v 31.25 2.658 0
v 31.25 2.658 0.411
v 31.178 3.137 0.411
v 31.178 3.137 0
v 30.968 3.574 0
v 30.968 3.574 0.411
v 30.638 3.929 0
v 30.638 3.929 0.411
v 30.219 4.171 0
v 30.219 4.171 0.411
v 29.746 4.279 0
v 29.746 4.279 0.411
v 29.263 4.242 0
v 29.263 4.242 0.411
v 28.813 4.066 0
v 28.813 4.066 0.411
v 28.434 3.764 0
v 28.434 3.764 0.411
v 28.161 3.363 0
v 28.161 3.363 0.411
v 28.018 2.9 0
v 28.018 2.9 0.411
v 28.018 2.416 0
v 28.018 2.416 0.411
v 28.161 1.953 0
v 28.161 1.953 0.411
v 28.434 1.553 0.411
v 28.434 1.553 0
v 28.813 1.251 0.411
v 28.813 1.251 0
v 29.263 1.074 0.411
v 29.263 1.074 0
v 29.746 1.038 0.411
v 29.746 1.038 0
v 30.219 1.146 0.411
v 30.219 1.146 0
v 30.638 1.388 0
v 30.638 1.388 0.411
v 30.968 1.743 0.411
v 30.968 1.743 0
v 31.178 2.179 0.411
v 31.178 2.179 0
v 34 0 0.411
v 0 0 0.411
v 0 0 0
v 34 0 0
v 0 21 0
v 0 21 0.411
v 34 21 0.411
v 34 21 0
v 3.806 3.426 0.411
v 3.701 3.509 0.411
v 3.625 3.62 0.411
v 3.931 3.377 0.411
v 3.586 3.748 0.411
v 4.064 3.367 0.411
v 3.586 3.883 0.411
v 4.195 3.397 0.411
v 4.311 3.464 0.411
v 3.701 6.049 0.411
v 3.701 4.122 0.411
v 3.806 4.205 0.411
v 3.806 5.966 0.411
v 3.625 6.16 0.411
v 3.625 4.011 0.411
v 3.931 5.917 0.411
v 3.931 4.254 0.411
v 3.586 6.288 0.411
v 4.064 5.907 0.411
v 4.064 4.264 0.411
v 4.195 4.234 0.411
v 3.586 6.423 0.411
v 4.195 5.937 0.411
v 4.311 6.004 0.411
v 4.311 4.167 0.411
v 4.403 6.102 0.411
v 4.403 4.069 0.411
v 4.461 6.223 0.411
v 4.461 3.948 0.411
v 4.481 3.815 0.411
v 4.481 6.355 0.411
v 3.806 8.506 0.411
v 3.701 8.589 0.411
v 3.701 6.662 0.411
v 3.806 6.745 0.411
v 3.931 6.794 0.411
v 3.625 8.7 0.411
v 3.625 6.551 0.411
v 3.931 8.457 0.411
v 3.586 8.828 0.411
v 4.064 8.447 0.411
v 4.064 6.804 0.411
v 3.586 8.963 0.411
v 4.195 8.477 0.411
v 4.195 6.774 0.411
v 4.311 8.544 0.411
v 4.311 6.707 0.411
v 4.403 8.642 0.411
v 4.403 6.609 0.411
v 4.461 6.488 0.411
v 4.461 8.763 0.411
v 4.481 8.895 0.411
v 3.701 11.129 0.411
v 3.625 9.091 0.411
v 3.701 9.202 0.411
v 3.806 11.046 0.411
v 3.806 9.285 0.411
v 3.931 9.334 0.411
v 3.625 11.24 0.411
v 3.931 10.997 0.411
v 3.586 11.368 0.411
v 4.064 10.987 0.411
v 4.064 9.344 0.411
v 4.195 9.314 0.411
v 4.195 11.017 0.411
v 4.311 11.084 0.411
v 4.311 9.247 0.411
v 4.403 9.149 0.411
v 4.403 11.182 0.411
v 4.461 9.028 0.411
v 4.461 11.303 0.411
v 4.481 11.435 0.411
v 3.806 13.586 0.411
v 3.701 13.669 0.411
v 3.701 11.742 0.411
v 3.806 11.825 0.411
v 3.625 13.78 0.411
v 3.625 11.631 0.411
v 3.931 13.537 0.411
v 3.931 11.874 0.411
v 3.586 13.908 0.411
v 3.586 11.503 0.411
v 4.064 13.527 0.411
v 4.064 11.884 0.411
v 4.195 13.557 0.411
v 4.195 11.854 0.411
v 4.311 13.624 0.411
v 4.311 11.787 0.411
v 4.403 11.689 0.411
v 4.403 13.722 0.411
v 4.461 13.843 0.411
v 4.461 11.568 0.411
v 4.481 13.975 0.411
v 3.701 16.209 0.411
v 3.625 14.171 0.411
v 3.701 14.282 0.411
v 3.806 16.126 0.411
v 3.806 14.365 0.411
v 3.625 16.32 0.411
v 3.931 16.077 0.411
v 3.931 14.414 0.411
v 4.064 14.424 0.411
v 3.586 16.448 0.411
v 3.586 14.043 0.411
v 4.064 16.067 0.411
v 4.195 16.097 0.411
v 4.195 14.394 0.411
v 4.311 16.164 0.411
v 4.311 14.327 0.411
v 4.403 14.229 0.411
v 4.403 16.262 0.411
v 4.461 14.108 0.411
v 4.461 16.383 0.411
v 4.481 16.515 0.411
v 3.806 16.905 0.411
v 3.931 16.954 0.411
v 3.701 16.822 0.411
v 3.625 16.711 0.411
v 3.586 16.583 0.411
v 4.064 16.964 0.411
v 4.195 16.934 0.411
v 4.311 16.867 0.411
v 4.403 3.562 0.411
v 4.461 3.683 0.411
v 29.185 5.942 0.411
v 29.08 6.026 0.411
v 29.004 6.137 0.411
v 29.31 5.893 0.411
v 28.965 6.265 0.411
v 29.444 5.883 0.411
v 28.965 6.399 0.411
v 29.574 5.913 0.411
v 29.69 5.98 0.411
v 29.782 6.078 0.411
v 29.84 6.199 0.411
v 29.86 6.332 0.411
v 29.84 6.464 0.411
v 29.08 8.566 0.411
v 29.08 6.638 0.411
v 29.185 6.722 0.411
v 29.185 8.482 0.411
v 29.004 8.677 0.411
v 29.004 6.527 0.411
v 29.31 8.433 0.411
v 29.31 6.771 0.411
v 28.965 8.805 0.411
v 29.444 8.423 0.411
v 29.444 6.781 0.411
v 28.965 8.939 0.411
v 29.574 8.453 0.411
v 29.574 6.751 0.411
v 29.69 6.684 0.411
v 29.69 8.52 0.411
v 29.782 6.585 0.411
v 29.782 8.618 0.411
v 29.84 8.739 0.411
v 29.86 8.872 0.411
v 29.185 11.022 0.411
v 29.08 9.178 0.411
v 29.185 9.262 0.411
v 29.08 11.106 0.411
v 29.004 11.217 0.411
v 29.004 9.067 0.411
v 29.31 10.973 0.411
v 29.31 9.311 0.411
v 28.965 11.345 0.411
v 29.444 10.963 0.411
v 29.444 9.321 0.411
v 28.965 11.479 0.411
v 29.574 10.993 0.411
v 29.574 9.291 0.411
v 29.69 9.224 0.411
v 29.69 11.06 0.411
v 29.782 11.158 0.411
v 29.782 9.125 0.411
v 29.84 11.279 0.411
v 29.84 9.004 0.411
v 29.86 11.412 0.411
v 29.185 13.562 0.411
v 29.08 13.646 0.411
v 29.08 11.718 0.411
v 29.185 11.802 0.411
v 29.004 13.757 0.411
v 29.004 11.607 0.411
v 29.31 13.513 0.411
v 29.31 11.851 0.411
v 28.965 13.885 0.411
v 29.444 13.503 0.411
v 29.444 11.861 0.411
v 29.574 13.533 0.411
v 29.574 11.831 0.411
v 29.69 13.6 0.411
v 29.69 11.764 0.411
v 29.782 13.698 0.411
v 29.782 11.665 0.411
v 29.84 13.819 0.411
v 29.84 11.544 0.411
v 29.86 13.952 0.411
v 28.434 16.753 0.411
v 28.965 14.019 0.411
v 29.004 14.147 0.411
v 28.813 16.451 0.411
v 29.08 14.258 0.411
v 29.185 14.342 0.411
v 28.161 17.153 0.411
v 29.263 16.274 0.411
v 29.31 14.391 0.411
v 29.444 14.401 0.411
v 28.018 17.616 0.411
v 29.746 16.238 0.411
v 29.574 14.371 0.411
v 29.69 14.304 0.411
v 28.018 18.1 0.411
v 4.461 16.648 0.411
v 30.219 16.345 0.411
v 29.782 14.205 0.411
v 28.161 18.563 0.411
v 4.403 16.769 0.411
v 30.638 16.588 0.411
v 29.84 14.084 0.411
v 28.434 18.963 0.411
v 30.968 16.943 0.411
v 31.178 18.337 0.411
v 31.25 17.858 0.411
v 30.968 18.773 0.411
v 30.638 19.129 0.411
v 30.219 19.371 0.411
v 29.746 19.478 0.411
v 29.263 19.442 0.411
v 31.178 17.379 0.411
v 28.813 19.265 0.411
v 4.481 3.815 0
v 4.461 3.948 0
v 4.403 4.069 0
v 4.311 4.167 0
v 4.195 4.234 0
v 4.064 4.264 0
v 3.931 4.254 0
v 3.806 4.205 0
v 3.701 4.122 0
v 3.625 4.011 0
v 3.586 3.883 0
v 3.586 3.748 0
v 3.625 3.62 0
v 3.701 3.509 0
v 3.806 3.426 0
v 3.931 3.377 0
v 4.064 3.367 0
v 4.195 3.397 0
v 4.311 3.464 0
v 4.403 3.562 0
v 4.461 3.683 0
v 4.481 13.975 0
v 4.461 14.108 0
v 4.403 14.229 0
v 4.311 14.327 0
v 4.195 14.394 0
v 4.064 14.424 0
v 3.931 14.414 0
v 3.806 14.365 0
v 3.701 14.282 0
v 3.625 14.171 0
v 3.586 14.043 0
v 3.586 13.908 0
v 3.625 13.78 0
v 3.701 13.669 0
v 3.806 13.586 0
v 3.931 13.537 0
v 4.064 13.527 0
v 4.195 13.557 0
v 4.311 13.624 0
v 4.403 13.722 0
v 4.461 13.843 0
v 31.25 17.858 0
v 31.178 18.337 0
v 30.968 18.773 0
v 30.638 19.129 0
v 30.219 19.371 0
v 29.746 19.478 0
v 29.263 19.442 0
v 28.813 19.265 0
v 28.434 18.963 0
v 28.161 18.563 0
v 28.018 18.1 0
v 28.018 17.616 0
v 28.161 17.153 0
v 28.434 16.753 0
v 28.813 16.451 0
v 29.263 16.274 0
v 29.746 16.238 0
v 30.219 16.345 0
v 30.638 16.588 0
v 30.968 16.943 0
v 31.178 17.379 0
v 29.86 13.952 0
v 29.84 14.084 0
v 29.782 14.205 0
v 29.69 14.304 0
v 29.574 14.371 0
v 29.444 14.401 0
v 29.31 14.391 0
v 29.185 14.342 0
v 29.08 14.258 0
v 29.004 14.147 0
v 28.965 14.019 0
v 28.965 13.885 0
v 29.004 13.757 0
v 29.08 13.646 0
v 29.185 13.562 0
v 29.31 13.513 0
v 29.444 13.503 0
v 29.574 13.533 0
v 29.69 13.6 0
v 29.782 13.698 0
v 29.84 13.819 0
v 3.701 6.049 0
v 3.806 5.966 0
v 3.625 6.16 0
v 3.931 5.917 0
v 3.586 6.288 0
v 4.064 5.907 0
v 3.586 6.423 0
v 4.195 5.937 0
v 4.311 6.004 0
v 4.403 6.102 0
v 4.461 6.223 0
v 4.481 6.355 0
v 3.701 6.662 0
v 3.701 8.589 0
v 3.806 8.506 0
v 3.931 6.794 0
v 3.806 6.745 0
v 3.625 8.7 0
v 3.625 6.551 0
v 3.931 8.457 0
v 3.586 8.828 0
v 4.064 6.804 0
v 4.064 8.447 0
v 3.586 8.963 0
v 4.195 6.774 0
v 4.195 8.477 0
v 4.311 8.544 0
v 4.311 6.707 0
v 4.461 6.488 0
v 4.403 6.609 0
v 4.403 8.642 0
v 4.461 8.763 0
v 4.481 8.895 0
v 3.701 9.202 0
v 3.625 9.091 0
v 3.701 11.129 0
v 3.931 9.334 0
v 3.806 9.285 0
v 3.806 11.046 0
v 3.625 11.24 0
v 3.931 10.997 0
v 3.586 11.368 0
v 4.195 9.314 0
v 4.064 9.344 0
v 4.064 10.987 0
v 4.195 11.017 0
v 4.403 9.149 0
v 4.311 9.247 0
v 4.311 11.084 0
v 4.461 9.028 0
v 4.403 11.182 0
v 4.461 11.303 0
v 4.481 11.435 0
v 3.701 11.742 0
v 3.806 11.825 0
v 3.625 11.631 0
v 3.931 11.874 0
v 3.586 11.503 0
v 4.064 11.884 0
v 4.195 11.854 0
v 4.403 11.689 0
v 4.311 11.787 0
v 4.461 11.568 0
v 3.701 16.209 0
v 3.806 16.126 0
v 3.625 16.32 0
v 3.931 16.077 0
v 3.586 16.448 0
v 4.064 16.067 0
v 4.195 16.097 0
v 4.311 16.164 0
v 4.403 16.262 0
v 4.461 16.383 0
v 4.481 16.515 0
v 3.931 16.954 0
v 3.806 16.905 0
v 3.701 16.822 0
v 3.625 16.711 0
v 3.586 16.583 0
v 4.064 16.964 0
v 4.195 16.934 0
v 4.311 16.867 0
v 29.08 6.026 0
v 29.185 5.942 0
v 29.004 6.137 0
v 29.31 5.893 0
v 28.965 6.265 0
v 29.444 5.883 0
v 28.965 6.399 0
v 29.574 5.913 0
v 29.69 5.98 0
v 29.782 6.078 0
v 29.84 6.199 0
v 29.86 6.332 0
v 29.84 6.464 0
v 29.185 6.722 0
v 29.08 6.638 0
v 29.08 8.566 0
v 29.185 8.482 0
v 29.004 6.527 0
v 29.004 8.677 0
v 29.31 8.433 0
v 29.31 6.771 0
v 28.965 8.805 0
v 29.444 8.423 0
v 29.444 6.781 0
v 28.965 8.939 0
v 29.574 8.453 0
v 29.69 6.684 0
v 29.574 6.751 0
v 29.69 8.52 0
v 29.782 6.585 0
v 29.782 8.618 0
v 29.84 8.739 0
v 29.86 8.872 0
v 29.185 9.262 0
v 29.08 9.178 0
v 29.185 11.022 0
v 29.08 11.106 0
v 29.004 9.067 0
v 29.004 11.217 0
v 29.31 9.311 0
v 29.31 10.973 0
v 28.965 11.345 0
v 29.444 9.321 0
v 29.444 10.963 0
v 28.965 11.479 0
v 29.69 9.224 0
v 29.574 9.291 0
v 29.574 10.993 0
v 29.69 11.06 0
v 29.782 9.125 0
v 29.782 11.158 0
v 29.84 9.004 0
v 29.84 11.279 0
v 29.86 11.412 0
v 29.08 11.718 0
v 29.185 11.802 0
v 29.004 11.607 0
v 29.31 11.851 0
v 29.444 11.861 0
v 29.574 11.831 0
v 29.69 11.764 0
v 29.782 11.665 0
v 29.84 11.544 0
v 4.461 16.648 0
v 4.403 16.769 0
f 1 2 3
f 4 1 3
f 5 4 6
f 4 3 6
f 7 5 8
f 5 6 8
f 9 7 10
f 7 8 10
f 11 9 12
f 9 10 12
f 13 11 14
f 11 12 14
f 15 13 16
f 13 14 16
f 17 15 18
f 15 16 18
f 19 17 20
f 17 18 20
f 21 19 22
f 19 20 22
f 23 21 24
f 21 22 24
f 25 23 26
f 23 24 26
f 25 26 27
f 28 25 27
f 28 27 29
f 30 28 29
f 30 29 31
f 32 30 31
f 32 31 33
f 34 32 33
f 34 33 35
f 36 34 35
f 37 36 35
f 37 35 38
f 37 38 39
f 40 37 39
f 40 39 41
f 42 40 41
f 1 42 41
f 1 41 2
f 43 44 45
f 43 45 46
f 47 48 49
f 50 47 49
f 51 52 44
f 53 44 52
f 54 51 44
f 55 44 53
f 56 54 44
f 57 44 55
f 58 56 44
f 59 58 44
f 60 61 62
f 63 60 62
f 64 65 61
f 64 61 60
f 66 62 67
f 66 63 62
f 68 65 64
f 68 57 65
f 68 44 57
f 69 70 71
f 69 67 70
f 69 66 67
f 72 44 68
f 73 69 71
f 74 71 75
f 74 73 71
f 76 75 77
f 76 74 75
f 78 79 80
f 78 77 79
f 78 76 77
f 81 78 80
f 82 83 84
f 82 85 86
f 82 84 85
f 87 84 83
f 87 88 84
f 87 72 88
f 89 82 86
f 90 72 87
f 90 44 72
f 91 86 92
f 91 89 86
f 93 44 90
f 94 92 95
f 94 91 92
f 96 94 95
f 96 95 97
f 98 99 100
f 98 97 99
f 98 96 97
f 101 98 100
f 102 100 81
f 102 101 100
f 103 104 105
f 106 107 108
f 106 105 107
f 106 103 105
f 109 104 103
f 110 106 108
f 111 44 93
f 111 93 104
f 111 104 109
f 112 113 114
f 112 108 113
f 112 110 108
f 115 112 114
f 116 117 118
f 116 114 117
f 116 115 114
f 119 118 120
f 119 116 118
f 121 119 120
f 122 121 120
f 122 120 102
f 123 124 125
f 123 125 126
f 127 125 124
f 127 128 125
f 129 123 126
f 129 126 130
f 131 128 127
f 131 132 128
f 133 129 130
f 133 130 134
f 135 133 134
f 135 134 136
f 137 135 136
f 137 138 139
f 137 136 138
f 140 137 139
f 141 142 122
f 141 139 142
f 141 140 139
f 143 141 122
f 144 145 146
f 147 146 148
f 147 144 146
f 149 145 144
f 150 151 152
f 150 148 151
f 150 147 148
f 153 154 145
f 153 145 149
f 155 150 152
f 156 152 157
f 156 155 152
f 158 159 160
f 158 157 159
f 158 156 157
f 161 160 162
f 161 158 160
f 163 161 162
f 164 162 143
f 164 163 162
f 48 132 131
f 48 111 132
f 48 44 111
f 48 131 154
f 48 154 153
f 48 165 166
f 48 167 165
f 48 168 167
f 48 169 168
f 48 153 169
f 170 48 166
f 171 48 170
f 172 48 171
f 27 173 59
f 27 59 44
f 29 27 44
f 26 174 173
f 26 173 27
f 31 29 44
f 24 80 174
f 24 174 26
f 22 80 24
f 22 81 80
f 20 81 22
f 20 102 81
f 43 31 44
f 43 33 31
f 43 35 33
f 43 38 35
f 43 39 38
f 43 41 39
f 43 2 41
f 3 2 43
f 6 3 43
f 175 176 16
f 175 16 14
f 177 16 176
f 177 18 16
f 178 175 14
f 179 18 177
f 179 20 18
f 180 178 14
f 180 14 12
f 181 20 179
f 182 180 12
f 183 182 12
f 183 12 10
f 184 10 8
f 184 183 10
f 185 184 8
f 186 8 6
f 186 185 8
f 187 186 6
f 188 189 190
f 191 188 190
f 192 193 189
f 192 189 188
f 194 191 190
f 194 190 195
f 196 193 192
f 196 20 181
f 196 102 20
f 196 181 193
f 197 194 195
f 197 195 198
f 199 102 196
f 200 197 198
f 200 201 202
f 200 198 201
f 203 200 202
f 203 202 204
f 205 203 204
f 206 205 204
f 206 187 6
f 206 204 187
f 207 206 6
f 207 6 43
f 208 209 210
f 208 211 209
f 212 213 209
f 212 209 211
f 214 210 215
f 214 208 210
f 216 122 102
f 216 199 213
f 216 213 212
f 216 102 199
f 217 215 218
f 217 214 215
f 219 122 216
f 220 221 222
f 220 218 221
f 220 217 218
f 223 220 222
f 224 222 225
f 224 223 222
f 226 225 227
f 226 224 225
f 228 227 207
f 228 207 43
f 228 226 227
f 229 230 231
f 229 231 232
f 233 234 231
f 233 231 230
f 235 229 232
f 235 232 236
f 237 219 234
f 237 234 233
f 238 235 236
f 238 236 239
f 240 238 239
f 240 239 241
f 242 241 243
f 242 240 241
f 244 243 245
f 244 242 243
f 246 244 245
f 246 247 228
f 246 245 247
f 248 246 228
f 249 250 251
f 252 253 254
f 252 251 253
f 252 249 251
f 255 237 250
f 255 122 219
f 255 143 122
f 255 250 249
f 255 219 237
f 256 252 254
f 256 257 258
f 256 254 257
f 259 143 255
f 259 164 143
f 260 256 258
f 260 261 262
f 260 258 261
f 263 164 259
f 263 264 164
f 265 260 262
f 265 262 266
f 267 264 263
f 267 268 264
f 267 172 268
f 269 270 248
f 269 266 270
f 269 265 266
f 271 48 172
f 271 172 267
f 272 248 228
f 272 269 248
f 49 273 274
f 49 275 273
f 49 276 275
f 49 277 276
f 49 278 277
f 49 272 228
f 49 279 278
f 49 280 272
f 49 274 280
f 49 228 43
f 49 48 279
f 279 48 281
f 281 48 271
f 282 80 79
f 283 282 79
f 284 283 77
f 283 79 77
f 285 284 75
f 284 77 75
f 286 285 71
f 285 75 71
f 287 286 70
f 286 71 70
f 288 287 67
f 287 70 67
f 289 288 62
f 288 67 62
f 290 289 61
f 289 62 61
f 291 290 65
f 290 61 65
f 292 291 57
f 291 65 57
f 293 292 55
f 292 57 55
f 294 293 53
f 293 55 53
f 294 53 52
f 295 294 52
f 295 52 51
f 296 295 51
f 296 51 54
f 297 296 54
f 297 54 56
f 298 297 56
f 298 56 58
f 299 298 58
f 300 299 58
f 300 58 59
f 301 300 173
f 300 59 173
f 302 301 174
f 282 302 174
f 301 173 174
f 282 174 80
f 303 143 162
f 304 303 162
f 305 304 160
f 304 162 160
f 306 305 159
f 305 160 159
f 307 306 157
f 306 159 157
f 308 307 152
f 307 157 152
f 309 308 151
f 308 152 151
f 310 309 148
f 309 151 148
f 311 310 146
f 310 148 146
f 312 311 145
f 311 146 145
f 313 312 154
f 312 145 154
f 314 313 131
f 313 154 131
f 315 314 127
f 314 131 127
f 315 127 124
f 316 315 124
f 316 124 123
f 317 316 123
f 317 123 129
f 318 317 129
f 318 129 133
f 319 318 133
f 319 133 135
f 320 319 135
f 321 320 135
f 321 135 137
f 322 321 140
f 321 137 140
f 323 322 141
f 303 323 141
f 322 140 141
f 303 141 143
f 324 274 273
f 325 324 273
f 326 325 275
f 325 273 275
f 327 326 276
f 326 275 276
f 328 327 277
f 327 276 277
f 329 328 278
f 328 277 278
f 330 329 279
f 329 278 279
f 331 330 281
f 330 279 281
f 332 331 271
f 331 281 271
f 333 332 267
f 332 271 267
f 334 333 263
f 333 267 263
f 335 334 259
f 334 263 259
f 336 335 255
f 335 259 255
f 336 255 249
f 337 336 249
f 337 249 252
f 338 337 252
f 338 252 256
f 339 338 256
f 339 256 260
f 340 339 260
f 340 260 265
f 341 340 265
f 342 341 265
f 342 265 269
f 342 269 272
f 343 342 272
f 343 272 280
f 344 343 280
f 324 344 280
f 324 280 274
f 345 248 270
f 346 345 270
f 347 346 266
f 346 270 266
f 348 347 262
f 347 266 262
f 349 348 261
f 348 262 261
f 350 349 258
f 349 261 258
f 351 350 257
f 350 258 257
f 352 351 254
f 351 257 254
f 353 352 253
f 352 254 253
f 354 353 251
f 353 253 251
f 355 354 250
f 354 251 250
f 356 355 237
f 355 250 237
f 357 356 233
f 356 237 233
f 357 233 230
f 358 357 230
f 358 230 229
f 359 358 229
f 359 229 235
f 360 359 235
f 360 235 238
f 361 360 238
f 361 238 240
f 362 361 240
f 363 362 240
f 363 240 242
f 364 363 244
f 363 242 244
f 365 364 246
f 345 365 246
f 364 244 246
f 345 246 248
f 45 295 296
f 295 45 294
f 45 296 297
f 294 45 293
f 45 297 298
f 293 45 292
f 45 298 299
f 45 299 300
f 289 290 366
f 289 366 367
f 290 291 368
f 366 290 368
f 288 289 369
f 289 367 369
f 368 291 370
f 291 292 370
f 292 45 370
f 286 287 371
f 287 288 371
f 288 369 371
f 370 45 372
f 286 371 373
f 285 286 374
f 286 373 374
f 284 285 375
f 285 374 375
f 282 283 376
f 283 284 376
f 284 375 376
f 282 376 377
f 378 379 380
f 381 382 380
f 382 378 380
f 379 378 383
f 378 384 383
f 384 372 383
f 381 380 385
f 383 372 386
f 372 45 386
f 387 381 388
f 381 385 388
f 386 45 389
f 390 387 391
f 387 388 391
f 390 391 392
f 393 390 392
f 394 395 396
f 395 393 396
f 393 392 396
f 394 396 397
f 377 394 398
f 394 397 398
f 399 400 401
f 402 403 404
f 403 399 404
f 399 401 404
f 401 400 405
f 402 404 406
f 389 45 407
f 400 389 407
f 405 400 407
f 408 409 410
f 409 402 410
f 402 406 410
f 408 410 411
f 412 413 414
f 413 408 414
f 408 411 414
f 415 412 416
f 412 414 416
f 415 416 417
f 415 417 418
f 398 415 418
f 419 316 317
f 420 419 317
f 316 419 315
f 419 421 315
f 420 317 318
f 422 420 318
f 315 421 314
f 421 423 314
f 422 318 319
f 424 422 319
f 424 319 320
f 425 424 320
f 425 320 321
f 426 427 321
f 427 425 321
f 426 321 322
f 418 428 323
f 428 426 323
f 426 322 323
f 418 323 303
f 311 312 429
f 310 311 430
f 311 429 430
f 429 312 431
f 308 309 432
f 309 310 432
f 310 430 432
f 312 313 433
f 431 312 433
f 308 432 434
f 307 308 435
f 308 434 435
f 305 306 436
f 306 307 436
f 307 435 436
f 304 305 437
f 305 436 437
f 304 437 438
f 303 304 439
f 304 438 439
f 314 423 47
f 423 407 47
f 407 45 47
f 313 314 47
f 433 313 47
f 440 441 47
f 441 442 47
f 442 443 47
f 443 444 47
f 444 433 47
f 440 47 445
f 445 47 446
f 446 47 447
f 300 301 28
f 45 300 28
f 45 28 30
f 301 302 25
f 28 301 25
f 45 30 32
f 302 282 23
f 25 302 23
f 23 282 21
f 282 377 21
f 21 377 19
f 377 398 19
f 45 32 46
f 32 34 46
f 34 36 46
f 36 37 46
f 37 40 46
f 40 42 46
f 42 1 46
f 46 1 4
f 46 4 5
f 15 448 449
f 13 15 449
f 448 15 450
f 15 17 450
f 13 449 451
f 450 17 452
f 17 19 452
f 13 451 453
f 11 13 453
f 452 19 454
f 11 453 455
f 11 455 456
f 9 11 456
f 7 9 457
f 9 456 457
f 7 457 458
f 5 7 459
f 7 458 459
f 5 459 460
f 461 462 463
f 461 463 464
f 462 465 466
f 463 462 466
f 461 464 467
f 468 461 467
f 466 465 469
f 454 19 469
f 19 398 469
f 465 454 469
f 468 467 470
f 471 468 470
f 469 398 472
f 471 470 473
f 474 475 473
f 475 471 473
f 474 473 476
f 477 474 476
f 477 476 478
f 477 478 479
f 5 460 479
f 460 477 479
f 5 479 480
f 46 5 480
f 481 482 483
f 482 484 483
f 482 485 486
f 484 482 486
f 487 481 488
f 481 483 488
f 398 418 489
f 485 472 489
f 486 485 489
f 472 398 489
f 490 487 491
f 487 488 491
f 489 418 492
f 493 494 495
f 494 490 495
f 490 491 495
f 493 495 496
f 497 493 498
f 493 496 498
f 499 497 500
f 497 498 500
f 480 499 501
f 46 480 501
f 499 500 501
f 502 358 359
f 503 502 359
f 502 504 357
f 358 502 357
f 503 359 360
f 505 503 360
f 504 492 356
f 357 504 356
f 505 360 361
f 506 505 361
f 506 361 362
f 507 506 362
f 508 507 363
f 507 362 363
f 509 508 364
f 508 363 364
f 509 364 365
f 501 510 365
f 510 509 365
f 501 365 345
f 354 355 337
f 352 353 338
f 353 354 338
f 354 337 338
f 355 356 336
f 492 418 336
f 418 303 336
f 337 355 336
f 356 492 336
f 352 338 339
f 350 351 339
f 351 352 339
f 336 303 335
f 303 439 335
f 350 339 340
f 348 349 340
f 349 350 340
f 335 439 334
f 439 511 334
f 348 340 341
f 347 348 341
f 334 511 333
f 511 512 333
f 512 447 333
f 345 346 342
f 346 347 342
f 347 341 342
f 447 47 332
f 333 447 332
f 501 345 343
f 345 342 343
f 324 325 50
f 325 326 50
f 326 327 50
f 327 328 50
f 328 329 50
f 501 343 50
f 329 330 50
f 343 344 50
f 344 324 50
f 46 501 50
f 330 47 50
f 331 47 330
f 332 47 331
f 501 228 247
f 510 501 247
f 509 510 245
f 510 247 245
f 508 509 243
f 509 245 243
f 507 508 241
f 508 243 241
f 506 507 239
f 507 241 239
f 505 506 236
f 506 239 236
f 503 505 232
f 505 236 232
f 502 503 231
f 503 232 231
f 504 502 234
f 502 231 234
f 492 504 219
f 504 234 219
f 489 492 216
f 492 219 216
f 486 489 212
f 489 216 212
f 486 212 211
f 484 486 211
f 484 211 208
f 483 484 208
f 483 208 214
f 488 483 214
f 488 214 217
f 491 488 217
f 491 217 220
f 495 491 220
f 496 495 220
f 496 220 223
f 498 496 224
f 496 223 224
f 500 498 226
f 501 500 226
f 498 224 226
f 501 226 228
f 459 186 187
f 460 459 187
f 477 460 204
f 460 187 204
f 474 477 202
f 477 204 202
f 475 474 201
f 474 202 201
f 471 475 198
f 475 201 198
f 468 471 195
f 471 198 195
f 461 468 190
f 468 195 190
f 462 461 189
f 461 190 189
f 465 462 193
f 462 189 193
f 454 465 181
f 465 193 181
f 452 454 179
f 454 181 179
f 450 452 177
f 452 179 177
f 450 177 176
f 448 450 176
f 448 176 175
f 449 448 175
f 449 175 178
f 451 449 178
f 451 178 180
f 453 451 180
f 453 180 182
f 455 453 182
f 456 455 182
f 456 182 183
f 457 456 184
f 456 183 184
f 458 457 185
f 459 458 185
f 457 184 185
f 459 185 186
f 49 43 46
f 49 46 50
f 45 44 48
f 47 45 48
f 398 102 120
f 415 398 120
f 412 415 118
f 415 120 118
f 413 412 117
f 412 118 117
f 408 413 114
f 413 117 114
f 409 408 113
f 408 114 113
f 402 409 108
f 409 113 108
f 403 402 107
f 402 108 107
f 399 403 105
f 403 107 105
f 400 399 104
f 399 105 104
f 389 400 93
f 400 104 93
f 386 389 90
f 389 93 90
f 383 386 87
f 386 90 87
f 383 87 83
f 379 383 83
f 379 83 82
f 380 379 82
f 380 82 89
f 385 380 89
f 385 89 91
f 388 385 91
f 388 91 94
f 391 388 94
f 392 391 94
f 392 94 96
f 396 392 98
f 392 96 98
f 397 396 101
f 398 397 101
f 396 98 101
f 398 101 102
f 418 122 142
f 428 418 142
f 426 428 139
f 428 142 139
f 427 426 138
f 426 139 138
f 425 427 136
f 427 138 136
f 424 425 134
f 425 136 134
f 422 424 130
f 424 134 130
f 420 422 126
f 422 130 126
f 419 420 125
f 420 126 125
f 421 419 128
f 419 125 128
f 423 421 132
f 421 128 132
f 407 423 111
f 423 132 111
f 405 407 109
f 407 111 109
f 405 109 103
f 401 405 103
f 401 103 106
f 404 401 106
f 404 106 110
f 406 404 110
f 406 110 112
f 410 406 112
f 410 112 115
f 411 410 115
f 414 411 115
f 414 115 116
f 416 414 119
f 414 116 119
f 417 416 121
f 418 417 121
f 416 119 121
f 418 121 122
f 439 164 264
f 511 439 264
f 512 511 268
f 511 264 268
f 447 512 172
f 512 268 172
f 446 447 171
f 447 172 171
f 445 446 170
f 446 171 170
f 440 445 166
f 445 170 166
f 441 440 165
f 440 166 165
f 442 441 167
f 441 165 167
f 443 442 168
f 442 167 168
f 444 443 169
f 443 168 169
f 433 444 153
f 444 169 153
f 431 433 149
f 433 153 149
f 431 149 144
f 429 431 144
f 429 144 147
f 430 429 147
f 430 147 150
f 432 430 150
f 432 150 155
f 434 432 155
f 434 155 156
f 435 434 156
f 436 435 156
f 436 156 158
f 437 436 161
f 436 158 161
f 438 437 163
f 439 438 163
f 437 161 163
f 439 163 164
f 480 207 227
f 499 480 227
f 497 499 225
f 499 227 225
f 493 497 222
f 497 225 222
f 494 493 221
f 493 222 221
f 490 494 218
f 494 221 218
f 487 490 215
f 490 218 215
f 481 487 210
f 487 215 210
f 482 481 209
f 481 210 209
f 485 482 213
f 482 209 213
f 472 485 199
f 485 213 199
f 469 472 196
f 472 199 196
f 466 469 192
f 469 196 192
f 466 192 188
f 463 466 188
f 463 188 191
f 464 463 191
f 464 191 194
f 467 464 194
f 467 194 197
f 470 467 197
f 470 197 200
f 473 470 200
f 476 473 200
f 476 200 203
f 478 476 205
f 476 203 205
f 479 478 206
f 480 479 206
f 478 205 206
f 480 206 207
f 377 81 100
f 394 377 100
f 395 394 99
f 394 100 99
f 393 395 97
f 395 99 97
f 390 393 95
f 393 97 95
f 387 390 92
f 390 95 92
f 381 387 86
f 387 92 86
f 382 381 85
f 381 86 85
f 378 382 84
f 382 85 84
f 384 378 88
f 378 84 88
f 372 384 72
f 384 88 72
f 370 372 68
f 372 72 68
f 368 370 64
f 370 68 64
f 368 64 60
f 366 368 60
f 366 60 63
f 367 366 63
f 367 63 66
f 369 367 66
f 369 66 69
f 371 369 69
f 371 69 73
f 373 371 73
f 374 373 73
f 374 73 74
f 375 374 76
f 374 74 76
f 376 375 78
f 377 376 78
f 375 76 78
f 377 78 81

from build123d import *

# Parameters (mm, degrees)
ESBO_O1_W                = 34.00000312
ESBO_O1_H                = 21.00000372
ESBO_O1_R                = 0.4499991
RESSALTO_EXTRUS_O1_DEPTH = 0.41148
ESBO_O2_R                = 1.625
CORTE_EXTRUS_O1_DEPTH    = 1.41148


with BuildPart() as part:
    # Esboço1 → Ressalto-extrusão1 (new body)
    with BuildSketch(Plane.XY.offset(0.41148)):
        with Locations((17.00001426, 10.50001456)):
            Rectangle(ESBO_O1_W, ESBO_O1_H)
        with Locations((29.409885994, 11.411813558)):
            Circle(ESBO_O1_R, mode=Mode.SUBTRACT)
        with Locations((29.409885994, 8.871813558)):
            Circle(ESBO_O1_R, mode=Mode.SUBTRACT)
        with Locations((29.409885994, 13.951813558)):
            Circle(ESBO_O1_R, mode=Mode.SUBTRACT)
        with Locations((29.409885994, 6.331813558)):
            Circle(ESBO_O1_R, mode=Mode.SUBTRACT)
        with Locations((4.030717622, 3.815479677)):
            Circle(ESBO_O1_R, mode=Mode.SUBTRACT)
        with Locations((4.030717622, 13.975479677)):
            Circle(ESBO_O1_R, mode=Mode.SUBTRACT)
        with Locations((4.030717622, 11.435479677)):
            Circle(ESBO_O1_R, mode=Mode.SUBTRACT)
        with Locations((4.030717622, 16.515479677)):
            Circle(ESBO_O1_R, mode=Mode.SUBTRACT)
        with Locations((4.030717622, 6.355479677)):
            Circle(ESBO_O1_R, mode=Mode.SUBTRACT)
        with Locations((4.030717622, 8.895479677)):
            Circle(ESBO_O1_R, mode=Mode.SUBTRACT)
    extrude(amount=-RESSALTO_EXTRUS_O1_DEPTH)

    # Esboço2 → Corte-extrusão1 (cut, through all)
    with BuildSketch(Plane.XY.offset(0.41148)):
        with Locations((29.625048643, 17.858037309)):
            Circle(ESBO_O2_R)
        with Locations((29.625048643, 2.658236219)):
            Circle(ESBO_O2_R)
    extrude(amount=-CORTE_EXTRUS_O1_DEPTH, mode=Mode.SUBTRACT)


solid = part.part
